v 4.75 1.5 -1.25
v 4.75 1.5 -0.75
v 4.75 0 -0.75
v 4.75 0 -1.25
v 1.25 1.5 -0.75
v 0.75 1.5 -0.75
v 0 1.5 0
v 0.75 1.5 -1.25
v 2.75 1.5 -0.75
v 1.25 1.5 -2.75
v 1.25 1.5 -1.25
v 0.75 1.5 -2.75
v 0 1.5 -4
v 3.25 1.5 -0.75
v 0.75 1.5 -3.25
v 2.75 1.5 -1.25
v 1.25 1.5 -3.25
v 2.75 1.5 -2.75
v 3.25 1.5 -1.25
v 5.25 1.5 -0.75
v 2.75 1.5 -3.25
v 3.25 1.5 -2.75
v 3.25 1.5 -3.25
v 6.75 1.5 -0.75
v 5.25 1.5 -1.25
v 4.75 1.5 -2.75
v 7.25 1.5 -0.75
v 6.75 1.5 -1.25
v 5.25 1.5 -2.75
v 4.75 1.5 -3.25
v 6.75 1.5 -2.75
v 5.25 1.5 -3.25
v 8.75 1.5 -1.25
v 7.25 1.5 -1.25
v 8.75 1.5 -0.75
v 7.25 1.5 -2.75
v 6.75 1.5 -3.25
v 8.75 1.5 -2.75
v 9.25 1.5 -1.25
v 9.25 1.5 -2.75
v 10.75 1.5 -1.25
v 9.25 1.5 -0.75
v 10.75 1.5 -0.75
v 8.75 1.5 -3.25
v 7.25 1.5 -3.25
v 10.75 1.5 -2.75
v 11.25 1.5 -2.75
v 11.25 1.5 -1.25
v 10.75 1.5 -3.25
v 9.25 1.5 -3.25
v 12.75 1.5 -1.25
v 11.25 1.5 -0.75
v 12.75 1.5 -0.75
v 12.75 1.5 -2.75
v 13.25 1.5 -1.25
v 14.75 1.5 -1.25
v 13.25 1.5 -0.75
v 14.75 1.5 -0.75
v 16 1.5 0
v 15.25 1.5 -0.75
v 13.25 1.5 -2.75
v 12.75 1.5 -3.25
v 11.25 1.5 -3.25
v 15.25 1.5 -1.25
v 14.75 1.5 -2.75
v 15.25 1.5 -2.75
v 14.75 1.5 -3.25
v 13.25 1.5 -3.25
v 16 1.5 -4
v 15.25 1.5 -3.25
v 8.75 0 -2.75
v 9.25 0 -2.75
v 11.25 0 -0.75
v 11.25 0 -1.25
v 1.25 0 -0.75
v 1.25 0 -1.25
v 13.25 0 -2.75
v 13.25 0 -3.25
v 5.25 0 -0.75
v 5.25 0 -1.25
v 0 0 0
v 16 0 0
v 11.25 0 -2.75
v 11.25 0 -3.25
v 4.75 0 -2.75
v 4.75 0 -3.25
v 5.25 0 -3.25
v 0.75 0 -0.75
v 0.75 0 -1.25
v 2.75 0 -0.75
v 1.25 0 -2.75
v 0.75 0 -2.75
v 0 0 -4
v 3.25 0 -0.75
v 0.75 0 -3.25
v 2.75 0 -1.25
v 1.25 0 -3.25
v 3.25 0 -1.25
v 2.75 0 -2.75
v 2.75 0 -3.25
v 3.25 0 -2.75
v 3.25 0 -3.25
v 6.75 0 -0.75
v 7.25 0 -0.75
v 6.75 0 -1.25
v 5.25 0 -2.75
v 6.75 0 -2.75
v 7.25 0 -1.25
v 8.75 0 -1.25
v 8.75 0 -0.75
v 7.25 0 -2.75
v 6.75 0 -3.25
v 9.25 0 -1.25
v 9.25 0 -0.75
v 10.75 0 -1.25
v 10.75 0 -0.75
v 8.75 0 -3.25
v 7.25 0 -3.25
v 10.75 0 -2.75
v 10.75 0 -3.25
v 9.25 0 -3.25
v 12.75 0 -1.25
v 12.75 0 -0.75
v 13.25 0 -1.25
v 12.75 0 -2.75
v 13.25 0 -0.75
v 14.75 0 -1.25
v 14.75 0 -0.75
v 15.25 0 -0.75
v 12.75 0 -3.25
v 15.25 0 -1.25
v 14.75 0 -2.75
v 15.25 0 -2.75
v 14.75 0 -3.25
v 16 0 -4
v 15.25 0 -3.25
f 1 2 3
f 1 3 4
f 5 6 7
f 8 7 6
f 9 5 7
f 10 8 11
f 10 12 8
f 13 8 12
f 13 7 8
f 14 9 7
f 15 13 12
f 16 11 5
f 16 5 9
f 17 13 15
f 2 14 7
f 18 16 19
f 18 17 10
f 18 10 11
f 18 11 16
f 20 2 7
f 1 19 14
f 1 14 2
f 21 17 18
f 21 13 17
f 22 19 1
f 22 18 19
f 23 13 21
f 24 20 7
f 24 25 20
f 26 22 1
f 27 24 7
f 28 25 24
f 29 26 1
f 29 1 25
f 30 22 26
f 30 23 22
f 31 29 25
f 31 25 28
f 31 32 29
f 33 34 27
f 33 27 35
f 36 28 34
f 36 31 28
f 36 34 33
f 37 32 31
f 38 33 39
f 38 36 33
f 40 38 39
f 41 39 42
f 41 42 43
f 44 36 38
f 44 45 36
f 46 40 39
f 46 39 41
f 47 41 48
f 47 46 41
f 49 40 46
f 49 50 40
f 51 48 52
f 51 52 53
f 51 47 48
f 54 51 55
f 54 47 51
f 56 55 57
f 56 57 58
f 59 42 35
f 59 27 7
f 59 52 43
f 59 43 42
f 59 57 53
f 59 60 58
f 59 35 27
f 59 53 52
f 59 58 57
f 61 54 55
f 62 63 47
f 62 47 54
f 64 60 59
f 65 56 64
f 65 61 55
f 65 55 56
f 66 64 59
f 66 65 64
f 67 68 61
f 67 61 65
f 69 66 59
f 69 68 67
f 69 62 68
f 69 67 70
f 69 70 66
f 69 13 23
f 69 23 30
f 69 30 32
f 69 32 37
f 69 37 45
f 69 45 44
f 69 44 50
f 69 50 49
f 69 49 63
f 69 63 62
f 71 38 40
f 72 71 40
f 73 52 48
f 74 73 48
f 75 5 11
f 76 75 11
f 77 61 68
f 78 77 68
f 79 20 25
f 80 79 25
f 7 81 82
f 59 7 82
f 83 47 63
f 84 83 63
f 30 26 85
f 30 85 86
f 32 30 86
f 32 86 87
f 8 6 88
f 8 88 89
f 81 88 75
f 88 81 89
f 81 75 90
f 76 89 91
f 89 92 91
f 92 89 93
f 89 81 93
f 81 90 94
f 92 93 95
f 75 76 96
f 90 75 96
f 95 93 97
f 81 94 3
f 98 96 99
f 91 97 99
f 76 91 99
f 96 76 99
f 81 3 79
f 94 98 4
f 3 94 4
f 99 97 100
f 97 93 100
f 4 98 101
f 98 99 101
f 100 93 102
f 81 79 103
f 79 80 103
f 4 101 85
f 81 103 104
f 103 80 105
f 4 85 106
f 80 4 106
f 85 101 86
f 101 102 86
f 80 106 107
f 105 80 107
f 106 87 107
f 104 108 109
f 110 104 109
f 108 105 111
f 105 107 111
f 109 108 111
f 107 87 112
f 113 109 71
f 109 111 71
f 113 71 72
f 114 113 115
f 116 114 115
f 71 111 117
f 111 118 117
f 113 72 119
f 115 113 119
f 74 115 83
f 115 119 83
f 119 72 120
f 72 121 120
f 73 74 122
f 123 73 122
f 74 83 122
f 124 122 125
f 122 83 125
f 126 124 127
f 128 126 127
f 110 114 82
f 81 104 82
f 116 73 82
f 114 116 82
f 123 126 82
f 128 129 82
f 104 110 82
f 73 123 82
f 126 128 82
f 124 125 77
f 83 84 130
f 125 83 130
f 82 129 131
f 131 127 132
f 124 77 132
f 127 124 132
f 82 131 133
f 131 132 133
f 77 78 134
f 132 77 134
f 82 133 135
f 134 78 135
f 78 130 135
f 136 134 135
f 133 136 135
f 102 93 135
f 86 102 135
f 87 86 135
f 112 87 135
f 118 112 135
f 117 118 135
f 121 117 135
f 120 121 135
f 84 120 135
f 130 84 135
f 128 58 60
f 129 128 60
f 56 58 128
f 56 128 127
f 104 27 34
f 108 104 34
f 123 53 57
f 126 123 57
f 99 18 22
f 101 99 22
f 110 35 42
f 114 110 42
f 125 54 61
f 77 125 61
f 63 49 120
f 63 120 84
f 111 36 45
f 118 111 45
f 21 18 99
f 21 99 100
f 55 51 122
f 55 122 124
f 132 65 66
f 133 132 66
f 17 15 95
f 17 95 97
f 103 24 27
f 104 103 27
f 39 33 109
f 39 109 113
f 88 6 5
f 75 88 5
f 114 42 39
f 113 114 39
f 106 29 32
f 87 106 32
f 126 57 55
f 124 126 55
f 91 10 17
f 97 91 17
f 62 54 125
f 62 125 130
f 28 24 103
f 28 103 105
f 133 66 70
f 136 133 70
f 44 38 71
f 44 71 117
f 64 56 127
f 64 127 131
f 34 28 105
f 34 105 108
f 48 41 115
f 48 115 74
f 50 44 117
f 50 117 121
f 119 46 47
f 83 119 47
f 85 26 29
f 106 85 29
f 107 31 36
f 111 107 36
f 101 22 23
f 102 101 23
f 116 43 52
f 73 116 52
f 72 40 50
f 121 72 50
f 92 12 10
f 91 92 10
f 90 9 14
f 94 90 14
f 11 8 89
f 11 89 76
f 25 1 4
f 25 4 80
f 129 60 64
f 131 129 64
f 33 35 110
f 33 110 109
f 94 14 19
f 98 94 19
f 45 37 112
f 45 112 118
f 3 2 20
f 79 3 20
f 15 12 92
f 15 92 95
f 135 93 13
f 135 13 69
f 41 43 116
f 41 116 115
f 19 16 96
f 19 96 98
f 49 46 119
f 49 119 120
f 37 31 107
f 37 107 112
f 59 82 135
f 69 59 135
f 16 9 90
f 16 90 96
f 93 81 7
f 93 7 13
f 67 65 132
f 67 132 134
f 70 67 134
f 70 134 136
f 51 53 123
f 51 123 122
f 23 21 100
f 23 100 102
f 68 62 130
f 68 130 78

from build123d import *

# Parameters (mm, degrees)
SKETCH1_W           = 16
SKETCH1_H           = 4
BOSS_EXTRUDE1_DEPTH = 1.5
SKETCH2_W           = 0.5
SKETCH2_H           = 0.5
CUT_EXTRUDE1_DEPTH  = 2


with BuildPart() as part:
    # Sketch1 → Boss-Extrude1 (new body)
    with BuildSketch(Plane(origin=(0, 0, 0), x_dir=(1, 0, 0), z_dir=(0, 1, 0))):
        with Locations((8, 2)):
            Rectangle(SKETCH1_W, SKETCH1_H)
    extrude(amount=BOSS_EXTRUDE1_DEPTH)

    # Sketch2 → Cut-Extrude1 (cut)
    with BuildSketch(Plane(origin=(0, 1.5, 0), x_dir=(1, 0, 0), z_dir=(0, 1, 0))):
        with Locations((3, 3)):
            Rectangle(SKETCH2_W, SKETCH2_H)
        with Locations((1, 3)):
            Rectangle(SKETCH2_W, SKETCH2_H)
        with Locations((5, 3)):
            Rectangle(SKETCH2_W, SKETCH2_H)
        with Locations((7, 3)):
            Rectangle(SKETCH2_W, SKETCH2_H)
        with Locations((9, 3)):
            Rectangle(SKETCH2_W, SKETCH2_H)
        with Locations((11, 3)):
            Rectangle(SKETCH2_W, SKETCH2_H)
        with Locations((13, 3)):
            Rectangle(SKETCH2_W, SKETCH2_H)
        with Locations((15, 3)):
            Rectangle(SKETCH2_W, SKETCH2_H)
        with Locations((17, 3)):
            Rectangle(SKETCH2_W, SKETCH2_H)
        with Locations((19, 3)):
            Rectangle(SKETCH2_W, SKETCH2_H)
        with Locations((21, 3)):
            Rectangle(SKETCH2_W, SKETCH2_H)
        with Locations((23, 3)):
            Rectangle(SKETCH2_W, SKETCH2_H)
        with Locations((25, 3)):
            Rectangle(SKETCH2_W, SKETCH2_H)
        with Locations((27, 3)):
            Rectangle(SKETCH2_W, SKETCH2_H)
        with Locations((29, 3)):
            Rectangle(SKETCH2_W, SKETCH2_H)
        with Locations((31, 3)):
            Rectangle(SKETCH2_W, SKETCH2_H)
        with Locations((33, 3)):
            Rectangle(SKETCH2_W, SKETCH2_H)
        with Locations((35, 3)):
            Rectangle(SKETCH2_W, SKETCH2_H)
        with Locations((1, 1)):
            Rectangle(SKETCH2_W, SKETCH2_H)
        with Locations((3, 1)):
            Rectangle(SKETCH2_W, SKETCH2_H)
        with Locations((5, 1)):
            Rectangle(SKETCH2_W, SKETCH2_H)
        with Locations((7, 1)):
            Rectangle(SKETCH2_W, SKETCH2_H)
        with Locations((9, 1)):
            Rectangle(SKETCH2_W, SKETCH2_H)
        with Locations((11, 1)):
            Rectangle(SKETCH2_W, SKETCH2_H)
        with Locations((13, 1)):
            Rectangle(SKETCH2_W, SKETCH2_H)
        with Locations((15, 1)):
            Rectangle(SKETCH2_W, SKETCH2_H)
        with Locations((17, 1)):
            Rectangle(SKETCH2_W, SKETCH2_H)
        with Locations((19, 1)):
            Rectangle(SKETCH2_W, SKETCH2_H)
        with Locations((21, 1)):
            Rectangle(SKETCH2_W, SKETCH2_H)
        with Locations((23, 1)):
            Rectangle(SKETCH2_W, SKETCH2_H)
        with Locations((25, 1)):
            Rectangle(SKETCH2_W, SKETCH2_H)
        with Locations((27, 1)):
            Rectangle(SKETCH2_W, SKETCH2_H)
        with Locations((29, 1)):
            Rectangle(SKETCH2_W, SKETCH2_H)
        with Locations((31, 1)):
            Rectangle(SKETCH2_W, SKETCH2_H)
        with Locations((33, 1)):
            Rectangle(SKETCH2_W, SKETCH2_H)
        with Locations((35, 1)):
            Rectangle(SKETCH2_W, SKETCH2_H)
    extrude(amount=-CUT_EXTRUDE1_DEPTH, mode=Mode.SUBTRACT)


solid = part.part
